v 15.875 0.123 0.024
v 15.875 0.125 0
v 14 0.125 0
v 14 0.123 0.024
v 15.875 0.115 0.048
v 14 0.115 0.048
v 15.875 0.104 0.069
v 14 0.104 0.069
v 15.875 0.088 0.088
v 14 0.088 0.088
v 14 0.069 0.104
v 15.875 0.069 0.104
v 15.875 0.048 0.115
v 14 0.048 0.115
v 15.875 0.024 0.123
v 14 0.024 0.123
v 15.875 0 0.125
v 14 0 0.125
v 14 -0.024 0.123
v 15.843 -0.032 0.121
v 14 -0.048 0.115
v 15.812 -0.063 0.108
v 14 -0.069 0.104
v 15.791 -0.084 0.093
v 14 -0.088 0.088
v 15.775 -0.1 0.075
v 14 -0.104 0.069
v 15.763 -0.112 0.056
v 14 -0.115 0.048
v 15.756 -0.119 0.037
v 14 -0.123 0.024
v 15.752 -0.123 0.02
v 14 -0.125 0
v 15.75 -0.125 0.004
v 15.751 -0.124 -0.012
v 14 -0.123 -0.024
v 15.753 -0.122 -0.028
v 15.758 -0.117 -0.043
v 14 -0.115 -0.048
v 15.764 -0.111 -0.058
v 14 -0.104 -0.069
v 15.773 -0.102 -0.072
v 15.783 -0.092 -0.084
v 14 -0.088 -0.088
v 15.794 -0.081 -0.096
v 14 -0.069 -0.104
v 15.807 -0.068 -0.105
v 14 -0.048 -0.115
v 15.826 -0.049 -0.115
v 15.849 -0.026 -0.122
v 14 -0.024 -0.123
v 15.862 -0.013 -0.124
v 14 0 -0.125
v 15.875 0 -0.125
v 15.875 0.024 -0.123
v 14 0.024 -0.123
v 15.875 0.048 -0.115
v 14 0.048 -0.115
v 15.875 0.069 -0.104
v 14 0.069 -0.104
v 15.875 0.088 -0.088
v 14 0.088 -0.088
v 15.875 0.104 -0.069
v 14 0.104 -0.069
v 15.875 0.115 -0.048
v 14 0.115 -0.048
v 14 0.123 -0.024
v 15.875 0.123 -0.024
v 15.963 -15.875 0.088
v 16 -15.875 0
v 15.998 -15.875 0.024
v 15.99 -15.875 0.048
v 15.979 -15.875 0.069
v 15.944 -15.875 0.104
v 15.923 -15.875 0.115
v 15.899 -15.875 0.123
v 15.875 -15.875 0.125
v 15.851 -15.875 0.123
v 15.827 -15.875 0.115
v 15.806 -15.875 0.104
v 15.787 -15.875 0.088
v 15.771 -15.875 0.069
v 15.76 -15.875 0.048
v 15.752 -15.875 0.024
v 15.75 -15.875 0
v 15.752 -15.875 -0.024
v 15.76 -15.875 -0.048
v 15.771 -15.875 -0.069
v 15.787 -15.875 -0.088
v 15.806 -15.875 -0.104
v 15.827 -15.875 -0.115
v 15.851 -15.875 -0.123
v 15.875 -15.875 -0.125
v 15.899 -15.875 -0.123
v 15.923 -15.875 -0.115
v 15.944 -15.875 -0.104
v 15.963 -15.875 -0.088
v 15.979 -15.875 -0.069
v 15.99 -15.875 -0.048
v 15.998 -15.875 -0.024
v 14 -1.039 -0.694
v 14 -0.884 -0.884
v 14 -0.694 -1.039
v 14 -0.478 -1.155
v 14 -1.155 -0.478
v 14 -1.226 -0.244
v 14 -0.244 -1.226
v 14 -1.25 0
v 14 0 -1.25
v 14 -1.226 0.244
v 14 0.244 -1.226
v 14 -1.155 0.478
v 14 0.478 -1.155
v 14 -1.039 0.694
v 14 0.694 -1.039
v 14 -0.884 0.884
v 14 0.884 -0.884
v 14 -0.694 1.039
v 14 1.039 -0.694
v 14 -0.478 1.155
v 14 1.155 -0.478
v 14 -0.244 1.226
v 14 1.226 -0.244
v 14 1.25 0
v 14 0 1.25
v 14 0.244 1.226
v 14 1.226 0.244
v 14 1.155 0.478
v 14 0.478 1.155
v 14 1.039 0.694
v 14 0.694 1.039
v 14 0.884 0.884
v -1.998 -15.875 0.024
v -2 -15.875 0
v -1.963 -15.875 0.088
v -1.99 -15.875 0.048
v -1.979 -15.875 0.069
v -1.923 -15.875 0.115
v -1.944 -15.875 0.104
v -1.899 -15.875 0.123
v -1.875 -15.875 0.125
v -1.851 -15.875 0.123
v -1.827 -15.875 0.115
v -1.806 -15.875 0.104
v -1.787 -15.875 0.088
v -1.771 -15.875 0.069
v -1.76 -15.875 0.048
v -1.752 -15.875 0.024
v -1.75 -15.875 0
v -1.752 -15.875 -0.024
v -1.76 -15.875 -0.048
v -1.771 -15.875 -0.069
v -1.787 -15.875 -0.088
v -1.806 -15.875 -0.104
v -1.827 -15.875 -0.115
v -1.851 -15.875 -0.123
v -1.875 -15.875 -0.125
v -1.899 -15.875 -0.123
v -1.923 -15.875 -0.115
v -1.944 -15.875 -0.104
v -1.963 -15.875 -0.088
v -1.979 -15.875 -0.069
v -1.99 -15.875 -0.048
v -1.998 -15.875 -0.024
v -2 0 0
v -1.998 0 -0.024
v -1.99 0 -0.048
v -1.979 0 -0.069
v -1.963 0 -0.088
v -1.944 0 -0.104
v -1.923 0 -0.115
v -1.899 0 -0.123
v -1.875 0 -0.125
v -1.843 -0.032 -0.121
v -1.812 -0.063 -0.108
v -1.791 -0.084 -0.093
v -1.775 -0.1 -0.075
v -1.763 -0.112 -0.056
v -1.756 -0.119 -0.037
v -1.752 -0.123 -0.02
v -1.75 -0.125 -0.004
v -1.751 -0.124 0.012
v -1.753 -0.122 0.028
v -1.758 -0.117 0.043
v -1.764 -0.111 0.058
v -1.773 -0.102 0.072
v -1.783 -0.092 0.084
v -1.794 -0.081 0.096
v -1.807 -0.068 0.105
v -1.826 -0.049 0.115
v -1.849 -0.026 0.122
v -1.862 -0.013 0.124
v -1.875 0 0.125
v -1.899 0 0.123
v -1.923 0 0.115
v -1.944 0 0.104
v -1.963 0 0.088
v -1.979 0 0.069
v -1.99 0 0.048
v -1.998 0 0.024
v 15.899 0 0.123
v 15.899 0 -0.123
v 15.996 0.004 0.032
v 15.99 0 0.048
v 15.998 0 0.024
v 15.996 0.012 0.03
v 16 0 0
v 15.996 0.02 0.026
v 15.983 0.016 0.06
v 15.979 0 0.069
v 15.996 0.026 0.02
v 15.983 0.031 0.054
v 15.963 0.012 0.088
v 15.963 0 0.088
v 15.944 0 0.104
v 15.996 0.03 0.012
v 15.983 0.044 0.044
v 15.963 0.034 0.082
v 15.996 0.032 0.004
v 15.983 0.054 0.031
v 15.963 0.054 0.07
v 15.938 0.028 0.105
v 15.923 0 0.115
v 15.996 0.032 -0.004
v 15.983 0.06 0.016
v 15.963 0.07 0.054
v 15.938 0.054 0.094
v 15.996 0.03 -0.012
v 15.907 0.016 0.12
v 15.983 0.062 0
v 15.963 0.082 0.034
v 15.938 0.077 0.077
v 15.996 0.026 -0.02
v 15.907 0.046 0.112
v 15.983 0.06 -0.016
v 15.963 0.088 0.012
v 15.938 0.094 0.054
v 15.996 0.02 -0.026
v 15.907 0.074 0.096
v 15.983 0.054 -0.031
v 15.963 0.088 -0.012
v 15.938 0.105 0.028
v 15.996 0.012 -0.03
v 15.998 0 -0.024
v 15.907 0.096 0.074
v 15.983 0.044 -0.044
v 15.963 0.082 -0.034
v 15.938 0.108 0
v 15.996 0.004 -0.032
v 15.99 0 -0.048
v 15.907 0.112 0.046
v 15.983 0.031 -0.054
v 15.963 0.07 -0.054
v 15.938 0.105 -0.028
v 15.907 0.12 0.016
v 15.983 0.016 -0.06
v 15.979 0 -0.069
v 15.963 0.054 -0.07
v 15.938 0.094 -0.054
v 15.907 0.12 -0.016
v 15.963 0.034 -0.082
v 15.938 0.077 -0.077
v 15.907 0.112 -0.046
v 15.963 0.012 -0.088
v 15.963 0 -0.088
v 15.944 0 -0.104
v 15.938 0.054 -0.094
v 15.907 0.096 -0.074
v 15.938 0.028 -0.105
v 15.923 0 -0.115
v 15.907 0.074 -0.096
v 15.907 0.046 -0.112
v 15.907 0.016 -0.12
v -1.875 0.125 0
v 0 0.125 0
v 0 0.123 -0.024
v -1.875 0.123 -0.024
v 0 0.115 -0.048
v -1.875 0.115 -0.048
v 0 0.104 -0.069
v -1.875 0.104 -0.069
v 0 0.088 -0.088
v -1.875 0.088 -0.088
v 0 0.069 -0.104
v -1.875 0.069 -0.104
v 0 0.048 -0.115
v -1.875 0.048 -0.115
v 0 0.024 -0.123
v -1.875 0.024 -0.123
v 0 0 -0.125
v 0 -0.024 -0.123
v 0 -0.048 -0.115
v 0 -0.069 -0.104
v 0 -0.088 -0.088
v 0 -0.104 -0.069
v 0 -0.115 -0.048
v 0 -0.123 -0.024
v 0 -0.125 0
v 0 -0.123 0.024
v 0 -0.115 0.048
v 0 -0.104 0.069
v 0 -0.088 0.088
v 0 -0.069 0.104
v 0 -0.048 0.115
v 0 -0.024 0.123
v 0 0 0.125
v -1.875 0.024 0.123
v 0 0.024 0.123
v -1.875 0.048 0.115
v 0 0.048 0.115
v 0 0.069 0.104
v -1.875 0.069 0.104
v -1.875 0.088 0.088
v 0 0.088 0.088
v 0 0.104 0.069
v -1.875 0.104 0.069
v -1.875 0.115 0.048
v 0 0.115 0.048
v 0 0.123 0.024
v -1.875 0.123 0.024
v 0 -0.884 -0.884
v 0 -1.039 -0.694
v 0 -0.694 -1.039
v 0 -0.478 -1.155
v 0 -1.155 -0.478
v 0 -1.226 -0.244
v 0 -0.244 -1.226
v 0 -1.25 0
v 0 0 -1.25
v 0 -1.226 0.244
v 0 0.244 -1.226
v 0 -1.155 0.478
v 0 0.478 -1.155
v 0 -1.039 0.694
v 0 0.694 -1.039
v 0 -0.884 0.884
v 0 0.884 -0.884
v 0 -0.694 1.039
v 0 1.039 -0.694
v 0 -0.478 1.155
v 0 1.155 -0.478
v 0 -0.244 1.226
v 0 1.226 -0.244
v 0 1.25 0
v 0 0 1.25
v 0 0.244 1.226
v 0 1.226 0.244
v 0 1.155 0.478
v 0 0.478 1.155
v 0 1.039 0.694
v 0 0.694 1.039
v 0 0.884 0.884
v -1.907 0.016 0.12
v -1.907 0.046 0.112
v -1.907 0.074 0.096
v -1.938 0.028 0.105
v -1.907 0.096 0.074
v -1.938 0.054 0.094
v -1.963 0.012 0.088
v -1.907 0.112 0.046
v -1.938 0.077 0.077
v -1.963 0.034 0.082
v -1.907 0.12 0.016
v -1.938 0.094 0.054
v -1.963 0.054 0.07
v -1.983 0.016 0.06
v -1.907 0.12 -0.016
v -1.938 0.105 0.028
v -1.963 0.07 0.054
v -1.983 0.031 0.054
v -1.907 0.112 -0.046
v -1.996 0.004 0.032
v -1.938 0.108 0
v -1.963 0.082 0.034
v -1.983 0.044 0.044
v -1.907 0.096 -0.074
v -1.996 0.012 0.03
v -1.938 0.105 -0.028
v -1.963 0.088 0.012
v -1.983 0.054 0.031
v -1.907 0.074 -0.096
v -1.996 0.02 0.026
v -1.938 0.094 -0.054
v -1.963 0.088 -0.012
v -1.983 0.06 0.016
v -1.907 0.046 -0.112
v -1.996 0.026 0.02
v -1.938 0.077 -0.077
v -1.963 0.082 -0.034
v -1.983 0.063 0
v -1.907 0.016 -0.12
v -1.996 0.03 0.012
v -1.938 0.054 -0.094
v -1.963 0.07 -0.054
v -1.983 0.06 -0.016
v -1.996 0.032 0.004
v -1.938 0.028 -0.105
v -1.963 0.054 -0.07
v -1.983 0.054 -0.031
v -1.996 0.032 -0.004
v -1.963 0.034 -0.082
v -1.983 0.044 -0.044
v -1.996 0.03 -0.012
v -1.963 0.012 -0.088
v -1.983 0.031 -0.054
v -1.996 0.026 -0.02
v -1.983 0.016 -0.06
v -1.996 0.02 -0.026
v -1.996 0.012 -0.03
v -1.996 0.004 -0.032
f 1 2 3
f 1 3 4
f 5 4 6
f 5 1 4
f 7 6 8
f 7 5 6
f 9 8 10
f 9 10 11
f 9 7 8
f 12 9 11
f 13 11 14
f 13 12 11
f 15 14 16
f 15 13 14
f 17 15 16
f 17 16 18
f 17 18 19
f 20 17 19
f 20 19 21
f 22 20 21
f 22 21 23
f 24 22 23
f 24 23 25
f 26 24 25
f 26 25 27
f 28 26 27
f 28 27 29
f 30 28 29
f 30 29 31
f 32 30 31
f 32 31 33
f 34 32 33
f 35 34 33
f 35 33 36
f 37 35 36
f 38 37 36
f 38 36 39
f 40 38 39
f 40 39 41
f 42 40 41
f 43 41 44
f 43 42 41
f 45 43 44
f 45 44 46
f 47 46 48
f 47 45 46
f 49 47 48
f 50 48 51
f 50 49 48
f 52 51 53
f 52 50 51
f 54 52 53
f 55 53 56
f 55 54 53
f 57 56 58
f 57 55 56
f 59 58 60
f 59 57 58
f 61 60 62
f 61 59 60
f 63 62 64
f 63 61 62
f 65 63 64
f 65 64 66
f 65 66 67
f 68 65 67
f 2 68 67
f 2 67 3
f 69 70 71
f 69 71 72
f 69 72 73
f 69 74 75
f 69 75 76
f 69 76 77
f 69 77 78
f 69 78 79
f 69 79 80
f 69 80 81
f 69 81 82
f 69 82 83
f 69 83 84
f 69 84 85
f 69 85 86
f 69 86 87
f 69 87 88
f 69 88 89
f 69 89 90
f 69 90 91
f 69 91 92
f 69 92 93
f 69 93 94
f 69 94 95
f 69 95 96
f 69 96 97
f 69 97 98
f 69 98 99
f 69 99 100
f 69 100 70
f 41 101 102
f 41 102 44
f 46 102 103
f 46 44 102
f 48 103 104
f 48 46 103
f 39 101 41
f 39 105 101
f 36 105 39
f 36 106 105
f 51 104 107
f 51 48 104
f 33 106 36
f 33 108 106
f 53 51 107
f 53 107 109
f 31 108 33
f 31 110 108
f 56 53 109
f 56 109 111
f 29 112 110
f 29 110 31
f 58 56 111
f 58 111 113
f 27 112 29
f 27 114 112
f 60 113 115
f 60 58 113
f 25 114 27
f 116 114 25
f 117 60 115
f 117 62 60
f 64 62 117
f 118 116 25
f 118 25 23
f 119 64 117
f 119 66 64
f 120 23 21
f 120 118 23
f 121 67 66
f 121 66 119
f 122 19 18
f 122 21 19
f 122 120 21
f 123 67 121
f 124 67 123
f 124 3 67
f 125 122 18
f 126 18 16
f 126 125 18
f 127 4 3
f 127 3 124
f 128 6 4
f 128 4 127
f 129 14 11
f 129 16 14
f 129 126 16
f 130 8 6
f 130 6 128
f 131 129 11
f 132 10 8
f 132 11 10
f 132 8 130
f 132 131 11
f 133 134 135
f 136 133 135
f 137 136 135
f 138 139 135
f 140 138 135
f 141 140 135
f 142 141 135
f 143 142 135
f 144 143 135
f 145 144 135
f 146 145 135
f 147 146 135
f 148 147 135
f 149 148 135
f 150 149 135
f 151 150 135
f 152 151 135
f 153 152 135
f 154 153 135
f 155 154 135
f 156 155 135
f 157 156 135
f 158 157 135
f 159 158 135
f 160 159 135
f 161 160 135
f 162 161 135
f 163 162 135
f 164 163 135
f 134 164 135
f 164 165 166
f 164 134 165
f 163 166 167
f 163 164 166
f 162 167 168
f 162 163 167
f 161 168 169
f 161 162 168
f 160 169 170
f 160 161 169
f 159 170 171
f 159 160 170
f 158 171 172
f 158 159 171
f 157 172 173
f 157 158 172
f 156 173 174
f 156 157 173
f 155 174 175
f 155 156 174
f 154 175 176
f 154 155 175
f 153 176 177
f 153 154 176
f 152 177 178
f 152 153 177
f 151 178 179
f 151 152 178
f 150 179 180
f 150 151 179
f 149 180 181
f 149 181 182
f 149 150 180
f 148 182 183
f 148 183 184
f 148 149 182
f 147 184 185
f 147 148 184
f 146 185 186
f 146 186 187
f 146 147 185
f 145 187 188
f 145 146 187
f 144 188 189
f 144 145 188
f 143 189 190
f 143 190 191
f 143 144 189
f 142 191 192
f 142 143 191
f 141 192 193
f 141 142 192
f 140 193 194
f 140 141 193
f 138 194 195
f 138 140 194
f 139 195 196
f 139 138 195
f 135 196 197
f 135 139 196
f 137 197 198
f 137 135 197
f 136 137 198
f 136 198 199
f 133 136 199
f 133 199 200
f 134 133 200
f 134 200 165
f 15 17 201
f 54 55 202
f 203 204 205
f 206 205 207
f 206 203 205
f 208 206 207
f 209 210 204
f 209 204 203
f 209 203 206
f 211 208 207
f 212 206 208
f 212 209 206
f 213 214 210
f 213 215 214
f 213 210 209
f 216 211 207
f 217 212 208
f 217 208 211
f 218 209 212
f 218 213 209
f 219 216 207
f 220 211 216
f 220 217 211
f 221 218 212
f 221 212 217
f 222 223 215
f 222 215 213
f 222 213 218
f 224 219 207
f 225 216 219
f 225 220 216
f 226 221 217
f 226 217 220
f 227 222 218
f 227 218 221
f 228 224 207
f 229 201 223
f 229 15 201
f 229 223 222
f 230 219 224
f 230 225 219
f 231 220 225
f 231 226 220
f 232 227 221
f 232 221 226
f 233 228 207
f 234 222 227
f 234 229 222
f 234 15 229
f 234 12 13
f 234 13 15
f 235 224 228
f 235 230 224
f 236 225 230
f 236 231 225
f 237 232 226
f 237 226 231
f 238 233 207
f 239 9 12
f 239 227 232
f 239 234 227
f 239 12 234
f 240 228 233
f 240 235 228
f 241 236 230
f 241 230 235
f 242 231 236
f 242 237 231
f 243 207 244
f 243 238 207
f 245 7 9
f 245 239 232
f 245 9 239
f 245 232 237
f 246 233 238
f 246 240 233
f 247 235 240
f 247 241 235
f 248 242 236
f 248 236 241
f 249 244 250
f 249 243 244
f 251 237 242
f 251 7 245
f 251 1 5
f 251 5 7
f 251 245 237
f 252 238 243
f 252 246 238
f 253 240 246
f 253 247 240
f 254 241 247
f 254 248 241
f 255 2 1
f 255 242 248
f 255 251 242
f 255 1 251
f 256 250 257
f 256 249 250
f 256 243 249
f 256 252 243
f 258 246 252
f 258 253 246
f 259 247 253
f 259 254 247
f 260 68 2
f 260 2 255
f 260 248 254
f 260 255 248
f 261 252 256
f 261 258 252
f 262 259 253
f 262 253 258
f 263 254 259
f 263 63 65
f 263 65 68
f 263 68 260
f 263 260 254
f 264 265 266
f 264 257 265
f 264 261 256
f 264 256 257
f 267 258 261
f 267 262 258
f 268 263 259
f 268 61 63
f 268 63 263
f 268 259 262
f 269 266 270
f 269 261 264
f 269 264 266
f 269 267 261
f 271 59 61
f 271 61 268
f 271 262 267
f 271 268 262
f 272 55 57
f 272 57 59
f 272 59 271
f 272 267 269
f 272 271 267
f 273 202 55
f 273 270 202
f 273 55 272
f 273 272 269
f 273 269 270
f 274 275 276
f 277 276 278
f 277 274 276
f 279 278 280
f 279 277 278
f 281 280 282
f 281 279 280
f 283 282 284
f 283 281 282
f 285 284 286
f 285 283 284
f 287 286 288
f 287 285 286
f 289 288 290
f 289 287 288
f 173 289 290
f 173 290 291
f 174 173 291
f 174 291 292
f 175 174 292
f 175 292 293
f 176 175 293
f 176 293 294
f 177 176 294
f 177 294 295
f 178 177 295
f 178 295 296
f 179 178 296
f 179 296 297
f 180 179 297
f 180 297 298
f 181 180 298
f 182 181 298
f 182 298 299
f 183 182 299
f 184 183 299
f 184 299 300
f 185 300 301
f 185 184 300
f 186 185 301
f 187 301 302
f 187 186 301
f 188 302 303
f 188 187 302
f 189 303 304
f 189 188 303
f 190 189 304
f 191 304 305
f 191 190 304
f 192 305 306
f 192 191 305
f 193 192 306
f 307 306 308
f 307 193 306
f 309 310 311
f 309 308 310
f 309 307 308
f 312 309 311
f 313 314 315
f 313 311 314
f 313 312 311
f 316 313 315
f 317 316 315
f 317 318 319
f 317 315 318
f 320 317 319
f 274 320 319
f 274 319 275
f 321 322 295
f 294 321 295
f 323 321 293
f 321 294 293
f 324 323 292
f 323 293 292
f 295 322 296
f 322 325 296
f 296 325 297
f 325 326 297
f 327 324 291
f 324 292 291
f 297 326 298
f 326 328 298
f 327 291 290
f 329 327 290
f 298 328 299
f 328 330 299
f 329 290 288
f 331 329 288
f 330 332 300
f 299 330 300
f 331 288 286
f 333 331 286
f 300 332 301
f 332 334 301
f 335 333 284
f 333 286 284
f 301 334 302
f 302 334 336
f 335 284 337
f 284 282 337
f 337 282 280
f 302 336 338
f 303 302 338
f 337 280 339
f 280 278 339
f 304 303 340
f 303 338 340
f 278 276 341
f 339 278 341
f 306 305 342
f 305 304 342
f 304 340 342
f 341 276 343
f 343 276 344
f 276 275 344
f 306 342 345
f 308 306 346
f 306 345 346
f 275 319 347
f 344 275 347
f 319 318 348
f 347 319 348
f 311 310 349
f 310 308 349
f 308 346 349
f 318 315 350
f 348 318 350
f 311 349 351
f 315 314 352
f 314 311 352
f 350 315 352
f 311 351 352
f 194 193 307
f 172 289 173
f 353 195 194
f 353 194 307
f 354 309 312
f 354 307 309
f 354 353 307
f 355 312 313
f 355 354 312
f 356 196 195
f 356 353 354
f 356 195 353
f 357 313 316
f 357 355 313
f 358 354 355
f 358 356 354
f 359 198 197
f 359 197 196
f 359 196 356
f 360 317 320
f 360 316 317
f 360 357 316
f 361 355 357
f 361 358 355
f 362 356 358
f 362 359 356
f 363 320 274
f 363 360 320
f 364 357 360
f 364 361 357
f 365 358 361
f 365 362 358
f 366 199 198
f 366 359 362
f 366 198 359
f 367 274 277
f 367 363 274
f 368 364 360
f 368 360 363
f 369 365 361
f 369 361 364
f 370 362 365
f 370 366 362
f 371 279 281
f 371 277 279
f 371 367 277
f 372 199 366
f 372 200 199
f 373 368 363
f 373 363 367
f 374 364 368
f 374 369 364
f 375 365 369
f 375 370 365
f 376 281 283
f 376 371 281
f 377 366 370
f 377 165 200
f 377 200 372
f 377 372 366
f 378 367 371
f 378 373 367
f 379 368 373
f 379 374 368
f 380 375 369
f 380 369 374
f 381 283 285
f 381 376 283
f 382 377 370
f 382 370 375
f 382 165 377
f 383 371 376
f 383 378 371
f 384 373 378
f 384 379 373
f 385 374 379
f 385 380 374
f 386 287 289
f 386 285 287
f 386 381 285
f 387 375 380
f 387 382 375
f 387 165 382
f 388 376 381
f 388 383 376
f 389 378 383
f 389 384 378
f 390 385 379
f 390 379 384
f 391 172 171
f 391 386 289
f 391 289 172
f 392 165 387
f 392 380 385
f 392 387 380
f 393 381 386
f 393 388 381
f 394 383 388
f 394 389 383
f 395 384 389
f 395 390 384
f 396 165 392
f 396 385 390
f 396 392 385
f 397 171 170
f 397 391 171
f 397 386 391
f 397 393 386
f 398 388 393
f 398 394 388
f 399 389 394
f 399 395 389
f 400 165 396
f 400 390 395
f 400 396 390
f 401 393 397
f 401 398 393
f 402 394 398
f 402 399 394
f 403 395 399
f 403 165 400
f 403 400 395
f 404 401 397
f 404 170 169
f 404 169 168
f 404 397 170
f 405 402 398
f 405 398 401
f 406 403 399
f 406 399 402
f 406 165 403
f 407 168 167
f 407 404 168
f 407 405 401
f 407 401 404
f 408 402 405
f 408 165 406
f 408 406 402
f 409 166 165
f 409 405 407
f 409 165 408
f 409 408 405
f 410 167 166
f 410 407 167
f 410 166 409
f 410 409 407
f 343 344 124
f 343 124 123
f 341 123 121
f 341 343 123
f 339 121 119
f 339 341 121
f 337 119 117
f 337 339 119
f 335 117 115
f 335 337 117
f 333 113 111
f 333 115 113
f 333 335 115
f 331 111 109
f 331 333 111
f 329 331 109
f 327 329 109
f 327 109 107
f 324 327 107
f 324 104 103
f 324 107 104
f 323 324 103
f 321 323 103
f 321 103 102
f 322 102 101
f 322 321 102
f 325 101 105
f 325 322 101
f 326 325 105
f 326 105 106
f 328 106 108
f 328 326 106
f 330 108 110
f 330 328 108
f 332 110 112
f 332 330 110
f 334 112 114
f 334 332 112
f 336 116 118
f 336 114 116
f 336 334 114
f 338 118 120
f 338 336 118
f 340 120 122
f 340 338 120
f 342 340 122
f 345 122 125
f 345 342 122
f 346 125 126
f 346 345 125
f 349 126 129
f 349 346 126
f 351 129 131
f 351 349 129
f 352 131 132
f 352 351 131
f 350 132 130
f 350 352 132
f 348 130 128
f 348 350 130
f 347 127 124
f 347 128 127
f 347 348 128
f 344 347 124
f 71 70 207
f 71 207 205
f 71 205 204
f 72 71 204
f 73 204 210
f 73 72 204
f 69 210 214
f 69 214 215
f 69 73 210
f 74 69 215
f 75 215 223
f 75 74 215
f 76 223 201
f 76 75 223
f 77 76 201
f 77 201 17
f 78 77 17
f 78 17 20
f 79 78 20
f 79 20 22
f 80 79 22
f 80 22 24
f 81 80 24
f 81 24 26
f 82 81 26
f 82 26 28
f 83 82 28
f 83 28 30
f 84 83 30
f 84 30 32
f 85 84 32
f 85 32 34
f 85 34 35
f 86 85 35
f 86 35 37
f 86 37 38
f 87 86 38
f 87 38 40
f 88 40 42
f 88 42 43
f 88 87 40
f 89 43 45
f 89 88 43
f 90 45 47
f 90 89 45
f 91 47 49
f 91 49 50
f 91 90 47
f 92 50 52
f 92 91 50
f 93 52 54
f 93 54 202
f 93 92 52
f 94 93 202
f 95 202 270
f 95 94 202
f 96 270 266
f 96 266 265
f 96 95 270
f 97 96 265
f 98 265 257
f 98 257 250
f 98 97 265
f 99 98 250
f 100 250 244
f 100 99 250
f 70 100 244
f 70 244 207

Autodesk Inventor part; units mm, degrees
ref_plane "YZ Plane" through (0, 0, 0) normal (1, 0, 0) x (0, 1, 0)
ref_plane "XZ Plane" through (0, 0, 0) normal (0, 1, 0) x (-1, 0, 0)
ref_plane "XY Plane" through (0, 0, 0) normal (0, 0, 1) x (1, 0, 0)
sketch "Sketch2" plane through (0, 0, 0) normal (1, 0, 0) x (0, 1, 0)
  circle A0 centre (0, 0) radius 1.25
  dimension "d8" = 2.5
extrude "Extrusion1" add sketch "Sketch2" along normal blind 14
sketch "Sketch6" plane through (0, 0, 0) normal (0, 0, 1) x (1, 0, 0)
  line L0 (14, -1.25) -> (14, 1.25) projected
  line L1 (14, 0) -> (14, 0.125)
  line L2 (14, 0.125) -> (15.875, 0.125)
  line L3 (16, 0) -> (16, -15.875)
  line L4 (14, 0) -> (15.875, 0)
  line L5 (15.875, 0) -> (15.875, -15.875)
  line L6 (15.875, -15.875) -> (16, -15.875)
  line L7 (15.875, 0) -> (16, 0)
  line L8 (17.9417, 0) -> (15.75, 0)
  arc A0 (15.875, -0.125) -> (15.75, 0) centre (15.75, -0.125) ccw
  line L9 (15.75, 0) -> (16, 0)
  line L10 (0, 0) -> (0, 0.125)
  line L11 (0, 0.125) -> (-1.875, 0.125)
  line L12 (-2, 0) -> (-2, -15.875)
  line L13 (-2, -15.875) -> (-1.875, -15.875)
  line L14 (-1.875, -15.875) -> (-1.875, -0.125)
  line L15 (-1.75, 0) -> (0, 0)
  arc A1 (-1.875, 0.125) -> (-2, 0) centre (-1.875, 0) ccw
  arc A2 (-1.75, 0) -> (-1.875, -0.125) centre (-1.75, -0.125) ccw
  line L16 (-1.75, 0) -> (-2, 0)
  line L17 (-1.875, -0.125) -> (-1.875, 0)
  arc A3 (16, 0) -> (15.875, 0.125) centre (15.875, 0) ccw
  point P0 (16, 0.125)
  point P1 (18.875, 0.125)
  point P2 (-2, 0.125)
  point P3 (-1.875, 0)
  dimension "d16" = 0.125
  dimension "d17" = 2
  dimension "d18" = 16
  dimension "d19" = 1.875
  dimension "d26" = 0.125
  dimension "d27" = 2
  dimension "d28" = 0.125
  dimension "d29" = 0.125
  dimension "d30" = 0.125
  dimension "d33" = 0.125
  dimension "d35" = 16
revolve "Revolution2" add sketch "Sketch6" angle 360 about axis through (14, 0, 0) along (1, 0, 0) contours L0 L2 A3 L7 L4
revolve "Revolution3" add sketch "Sketch6" angle 360 about axis through (15.875, 0, 0) along (0, -1, 0) contours L7 L3 L6 L5
revolve "Revolution4" add sketch "Sketch6" angle 360 about axis through (-1.75, 0, 0) along (1, 0, 0) contours L15 L16 A1 L11 L10
revolve "Revolution5" add sketch "Sketch6" angle 360 about axis through (-1.875, -15.875, 0) along (0, 1, 0) contours L14 L13 L12 L16 L17
equation "\"d27\" = d17"
equation "\"d35\" = d18"
properties part number "Reed Switch Frontal" material "Aluminum 6061"
